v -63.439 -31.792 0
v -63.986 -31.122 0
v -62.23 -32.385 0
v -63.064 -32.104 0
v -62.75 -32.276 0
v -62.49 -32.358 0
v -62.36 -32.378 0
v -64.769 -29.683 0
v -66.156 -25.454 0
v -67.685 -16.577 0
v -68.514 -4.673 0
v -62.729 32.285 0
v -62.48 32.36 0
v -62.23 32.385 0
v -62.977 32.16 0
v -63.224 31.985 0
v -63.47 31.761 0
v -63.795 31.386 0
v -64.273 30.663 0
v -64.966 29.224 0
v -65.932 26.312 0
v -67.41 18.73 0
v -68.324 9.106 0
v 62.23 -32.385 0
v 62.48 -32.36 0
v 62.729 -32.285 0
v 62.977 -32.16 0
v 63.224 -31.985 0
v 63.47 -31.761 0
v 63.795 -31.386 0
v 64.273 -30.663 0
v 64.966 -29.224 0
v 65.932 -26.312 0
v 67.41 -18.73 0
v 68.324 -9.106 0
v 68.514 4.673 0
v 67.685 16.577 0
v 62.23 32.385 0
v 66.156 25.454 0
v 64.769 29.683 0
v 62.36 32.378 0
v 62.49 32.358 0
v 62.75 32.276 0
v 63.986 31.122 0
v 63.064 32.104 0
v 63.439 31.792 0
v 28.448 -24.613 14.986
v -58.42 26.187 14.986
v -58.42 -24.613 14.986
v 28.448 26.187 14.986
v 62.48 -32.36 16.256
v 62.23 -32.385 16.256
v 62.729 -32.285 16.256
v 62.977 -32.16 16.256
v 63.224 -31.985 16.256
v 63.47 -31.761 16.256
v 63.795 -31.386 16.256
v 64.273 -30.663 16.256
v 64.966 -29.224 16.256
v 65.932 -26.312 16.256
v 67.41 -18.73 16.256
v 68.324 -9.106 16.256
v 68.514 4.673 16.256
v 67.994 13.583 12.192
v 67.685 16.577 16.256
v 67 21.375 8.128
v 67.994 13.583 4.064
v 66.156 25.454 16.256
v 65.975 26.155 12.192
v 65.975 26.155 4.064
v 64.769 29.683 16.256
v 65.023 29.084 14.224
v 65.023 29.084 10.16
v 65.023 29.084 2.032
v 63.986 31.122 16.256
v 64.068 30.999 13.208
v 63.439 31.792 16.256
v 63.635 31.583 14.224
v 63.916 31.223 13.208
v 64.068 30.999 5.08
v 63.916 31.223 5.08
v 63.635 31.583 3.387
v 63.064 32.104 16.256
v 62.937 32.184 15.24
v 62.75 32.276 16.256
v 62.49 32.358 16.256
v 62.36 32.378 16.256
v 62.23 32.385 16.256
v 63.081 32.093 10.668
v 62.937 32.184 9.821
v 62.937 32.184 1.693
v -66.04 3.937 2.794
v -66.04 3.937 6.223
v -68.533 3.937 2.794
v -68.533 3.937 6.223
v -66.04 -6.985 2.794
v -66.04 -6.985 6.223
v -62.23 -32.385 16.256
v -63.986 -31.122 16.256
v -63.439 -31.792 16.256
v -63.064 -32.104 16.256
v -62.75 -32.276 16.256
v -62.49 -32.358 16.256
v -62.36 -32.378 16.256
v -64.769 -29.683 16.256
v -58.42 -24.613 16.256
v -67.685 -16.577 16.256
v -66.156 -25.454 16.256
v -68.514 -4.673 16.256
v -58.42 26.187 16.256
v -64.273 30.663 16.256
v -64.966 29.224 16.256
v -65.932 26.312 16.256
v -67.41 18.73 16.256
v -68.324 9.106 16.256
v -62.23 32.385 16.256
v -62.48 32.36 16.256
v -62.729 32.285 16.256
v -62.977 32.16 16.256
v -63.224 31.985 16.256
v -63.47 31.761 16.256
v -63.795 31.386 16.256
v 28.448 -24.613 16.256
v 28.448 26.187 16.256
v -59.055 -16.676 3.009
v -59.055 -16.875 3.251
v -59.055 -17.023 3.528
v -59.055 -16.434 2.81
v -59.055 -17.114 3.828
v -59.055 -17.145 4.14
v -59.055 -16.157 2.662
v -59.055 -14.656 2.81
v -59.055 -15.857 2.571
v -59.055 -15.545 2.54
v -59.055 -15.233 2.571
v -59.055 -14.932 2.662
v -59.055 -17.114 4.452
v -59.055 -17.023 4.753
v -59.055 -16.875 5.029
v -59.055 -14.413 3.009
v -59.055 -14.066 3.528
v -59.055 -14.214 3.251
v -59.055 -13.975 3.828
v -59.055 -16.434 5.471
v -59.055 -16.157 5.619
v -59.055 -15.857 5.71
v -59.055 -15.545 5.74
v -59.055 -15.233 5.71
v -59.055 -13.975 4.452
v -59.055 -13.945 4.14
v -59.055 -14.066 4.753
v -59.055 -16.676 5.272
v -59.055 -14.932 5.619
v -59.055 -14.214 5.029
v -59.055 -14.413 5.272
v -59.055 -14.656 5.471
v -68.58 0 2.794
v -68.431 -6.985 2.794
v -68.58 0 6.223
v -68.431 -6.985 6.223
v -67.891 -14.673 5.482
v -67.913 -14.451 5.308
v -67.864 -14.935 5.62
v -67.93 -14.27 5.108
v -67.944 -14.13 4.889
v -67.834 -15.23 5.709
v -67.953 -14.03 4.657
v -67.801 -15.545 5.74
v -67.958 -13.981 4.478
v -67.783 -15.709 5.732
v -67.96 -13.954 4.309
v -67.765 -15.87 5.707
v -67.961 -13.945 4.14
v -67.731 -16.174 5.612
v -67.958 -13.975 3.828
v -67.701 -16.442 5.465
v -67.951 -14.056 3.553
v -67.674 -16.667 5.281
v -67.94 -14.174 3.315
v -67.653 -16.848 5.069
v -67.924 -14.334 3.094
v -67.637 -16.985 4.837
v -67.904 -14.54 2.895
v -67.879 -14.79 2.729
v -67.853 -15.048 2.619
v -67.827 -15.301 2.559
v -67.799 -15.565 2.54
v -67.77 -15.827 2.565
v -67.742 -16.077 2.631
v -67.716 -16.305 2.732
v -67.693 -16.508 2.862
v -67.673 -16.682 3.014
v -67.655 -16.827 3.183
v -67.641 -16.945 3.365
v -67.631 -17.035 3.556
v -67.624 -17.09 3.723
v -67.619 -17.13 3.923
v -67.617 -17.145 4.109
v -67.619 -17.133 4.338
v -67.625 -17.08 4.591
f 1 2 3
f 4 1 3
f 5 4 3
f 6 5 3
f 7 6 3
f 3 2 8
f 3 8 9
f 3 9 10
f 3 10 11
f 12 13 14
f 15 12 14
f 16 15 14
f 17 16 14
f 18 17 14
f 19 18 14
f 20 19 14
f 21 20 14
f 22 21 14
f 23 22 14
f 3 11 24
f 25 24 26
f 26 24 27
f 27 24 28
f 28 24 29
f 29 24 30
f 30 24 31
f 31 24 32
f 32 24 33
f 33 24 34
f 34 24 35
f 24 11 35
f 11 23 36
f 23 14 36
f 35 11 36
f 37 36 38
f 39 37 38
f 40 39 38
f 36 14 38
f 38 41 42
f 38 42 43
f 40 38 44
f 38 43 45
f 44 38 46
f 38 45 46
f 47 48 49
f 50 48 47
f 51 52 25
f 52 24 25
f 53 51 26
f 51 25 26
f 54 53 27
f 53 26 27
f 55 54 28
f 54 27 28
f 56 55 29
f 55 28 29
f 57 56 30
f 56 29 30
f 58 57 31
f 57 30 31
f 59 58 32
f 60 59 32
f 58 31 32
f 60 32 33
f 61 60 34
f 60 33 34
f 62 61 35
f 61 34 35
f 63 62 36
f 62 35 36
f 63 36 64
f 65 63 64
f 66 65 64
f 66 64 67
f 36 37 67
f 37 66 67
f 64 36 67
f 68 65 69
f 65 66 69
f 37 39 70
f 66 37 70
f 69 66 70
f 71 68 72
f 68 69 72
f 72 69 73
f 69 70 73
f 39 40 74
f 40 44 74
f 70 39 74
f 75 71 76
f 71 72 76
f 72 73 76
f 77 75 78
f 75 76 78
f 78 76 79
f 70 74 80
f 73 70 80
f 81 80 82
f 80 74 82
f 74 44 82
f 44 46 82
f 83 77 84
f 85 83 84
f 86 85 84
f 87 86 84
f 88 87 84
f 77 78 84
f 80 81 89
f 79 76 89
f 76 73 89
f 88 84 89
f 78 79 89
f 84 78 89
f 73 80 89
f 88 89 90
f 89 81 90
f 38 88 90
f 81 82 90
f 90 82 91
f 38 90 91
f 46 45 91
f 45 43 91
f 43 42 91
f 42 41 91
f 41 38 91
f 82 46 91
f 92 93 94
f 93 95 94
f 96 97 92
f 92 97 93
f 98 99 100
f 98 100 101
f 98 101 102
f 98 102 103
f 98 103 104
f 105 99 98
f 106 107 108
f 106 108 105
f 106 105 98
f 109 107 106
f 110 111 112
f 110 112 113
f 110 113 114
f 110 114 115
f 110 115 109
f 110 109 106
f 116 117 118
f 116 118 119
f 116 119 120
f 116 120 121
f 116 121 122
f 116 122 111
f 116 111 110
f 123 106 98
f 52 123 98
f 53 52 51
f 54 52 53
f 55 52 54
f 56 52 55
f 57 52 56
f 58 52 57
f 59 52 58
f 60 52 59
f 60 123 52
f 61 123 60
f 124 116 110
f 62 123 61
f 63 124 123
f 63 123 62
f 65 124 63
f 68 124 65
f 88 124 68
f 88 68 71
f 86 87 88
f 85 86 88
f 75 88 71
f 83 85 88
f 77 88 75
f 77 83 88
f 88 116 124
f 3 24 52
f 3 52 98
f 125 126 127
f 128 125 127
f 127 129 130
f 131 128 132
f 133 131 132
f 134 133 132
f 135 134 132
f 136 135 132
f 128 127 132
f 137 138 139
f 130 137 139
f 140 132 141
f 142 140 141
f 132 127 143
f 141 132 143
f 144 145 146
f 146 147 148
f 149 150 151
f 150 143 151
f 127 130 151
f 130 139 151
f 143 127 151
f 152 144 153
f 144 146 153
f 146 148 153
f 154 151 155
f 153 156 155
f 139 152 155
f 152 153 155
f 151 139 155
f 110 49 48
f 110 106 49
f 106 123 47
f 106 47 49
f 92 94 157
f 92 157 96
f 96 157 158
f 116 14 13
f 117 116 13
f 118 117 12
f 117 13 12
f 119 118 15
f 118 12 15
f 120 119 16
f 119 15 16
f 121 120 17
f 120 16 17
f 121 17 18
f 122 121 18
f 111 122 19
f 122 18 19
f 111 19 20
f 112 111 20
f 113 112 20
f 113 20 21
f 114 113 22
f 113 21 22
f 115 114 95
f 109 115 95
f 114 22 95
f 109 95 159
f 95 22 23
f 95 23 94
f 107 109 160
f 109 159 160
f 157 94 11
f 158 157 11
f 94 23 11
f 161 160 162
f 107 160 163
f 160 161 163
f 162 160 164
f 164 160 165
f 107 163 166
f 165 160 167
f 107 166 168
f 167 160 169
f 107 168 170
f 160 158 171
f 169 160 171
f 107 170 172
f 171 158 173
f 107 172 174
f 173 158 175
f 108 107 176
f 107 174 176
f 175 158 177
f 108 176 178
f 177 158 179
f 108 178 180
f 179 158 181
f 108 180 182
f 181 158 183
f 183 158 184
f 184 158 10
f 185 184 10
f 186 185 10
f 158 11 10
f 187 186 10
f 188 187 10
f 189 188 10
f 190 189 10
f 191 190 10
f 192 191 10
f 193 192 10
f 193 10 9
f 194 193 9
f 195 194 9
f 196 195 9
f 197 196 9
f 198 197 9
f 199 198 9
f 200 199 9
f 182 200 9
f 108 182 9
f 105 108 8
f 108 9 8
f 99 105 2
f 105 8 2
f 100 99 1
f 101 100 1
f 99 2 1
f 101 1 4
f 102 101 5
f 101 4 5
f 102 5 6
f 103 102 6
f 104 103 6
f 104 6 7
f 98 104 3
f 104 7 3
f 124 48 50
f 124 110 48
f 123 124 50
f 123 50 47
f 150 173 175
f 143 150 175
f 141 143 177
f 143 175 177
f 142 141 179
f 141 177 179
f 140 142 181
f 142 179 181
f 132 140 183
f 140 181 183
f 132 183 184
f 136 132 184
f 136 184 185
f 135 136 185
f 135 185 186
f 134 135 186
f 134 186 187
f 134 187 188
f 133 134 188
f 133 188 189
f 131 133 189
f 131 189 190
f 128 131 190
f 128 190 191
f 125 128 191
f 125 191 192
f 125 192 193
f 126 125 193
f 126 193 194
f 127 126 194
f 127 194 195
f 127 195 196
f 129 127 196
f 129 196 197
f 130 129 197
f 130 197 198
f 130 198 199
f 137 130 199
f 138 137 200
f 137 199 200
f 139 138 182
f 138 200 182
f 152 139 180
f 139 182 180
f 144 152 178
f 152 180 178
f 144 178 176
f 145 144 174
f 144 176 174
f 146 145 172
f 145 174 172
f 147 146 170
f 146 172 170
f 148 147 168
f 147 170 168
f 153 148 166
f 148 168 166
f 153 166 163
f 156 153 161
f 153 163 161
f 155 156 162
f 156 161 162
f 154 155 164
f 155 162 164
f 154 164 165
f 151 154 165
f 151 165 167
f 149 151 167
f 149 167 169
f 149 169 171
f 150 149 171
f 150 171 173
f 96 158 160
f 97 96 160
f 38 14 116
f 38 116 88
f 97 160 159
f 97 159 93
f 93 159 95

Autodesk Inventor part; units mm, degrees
ref_plane "XZ Plane" through (0, 0, 0) normal (0, 1, 0) x (-1, 0, 0)
ref_plane "XY Plane" through (0, 0, 0) normal (0, 0, 1) x (1, 0, 0)
sketch "Sketch1" plane through (0, 0, 0) normal (0, 0, 1) x (1, 0, 0)
  line L0 (-62.23, 32.385) -> (62.23, 32.385)
  line L1 (62.23, -32.385) -> (-62.23, -32.385)
  line L2 (62.23, 0) -> (68.58, 0) construction
  line L3 (-62.23, 0) -> (-68.58, 0) construction
  ellipse E0 centre (-62.23, 0) end of major axis (-68.58, 0) minor radius 32.385 (-62.23, 32.385) -> (-62.23, -32.385) ccw
  ellipse E1 centre (62.23, 0) end of major axis (68.58, 0) minor radius 32.385 (62.23, -32.385) -> (62.23, 32.385) ccw
  point P0 (0, 0)
  dimension "d2" = 64.77
  dimension "d3" = 32.385
  dimension "d4" = 6.35
  dimension "d5" = 6.35
  dimension "d6" = 62.23
  dimension "d7" = 68.58
extrude "Extrusion1" add sketch "Sketch1" along normal blind 16.256
ref_plane "Work Plane1" through (-68.58, 0, 0) normal (1, 0, 0) x (0, 1, 0)
sketch "Sketch2" plane through (0, 0, 0) normal (1, 0, 0) x (0, 1, 0)
  point P0 (0, 0)
sketch "Sketch3" plane through (-68.58, 0, 0) normal (1, 0, 0) x (0, 1, 0)
  circle A0 centre (-15.5448, 4.1402) radius 1.6002
  line L0 (-32.385, 0) -> (32.385, 0) projected
  line L1 (-32.385, 0) -> (-32.385, 16.256) projected
  point P0 (0, 0)
  dimension "d10" = 3.2004
  dimension "d11" = 2.54
  dimension "d12" = 15.24
extrude "Extrusion2" cut sketch "Sketch3" along normal blind 9.525
sketch "Sketch4" plane through (-68.58, 0, 0) normal (1, 0, 0) x (0, 1, 0)
  line L0 (3.937, 2.794) -> (-6.985, 2.794)
  line L1 (-6.985, 2.794) -> (-6.985, 6.223)
  line L2 (-6.985, 6.223) -> (3.937, 6.223)
  line L3 (3.937, 6.223) -> (3.937, 2.794)
  line L4 (-32.385, 0) -> (32.385, 0) projected
  line L5 (-32.385, 0) -> (-32.385, 16.256) projected
  point P0 (0, 0)
  dimension "d15" = 3.429
  dimension "d16" = 10.922
  dimension "d17" = 2.794
  dimension "d18" = 25.4
extrude "Extrusion3" cut sketch "Sketch4" along normal blind 2.54
sketch "Sketch5" plane through (0, 0, 16.256) normal (0, 0, 1) x (1, 0, 0)
  line L0 (-62.23, 32.385) -> (62.23, 32.385) projected
  line L1 (-58.42, 26.1874) -> (28.448, 26.1874)
  line L2 (28.448, 26.1874) -> (28.448, -24.6126)
  line L3 (28.448, -24.6126) -> (-58.42, -24.6126)
  line L4 (-58.42, -24.6126) -> (-58.42, 26.1874)
  point P0 (0, 0)
  dimension "d21" = 50.8
  dimension "d22" = 86.868
  dimension "d23" = 3.81
  dimension "d24" = 6.1976
extrude "Extrusion4" cut sketch "Sketch5" against normal blind 1.27
properties part number "SprintSamsungGalaxyS"
